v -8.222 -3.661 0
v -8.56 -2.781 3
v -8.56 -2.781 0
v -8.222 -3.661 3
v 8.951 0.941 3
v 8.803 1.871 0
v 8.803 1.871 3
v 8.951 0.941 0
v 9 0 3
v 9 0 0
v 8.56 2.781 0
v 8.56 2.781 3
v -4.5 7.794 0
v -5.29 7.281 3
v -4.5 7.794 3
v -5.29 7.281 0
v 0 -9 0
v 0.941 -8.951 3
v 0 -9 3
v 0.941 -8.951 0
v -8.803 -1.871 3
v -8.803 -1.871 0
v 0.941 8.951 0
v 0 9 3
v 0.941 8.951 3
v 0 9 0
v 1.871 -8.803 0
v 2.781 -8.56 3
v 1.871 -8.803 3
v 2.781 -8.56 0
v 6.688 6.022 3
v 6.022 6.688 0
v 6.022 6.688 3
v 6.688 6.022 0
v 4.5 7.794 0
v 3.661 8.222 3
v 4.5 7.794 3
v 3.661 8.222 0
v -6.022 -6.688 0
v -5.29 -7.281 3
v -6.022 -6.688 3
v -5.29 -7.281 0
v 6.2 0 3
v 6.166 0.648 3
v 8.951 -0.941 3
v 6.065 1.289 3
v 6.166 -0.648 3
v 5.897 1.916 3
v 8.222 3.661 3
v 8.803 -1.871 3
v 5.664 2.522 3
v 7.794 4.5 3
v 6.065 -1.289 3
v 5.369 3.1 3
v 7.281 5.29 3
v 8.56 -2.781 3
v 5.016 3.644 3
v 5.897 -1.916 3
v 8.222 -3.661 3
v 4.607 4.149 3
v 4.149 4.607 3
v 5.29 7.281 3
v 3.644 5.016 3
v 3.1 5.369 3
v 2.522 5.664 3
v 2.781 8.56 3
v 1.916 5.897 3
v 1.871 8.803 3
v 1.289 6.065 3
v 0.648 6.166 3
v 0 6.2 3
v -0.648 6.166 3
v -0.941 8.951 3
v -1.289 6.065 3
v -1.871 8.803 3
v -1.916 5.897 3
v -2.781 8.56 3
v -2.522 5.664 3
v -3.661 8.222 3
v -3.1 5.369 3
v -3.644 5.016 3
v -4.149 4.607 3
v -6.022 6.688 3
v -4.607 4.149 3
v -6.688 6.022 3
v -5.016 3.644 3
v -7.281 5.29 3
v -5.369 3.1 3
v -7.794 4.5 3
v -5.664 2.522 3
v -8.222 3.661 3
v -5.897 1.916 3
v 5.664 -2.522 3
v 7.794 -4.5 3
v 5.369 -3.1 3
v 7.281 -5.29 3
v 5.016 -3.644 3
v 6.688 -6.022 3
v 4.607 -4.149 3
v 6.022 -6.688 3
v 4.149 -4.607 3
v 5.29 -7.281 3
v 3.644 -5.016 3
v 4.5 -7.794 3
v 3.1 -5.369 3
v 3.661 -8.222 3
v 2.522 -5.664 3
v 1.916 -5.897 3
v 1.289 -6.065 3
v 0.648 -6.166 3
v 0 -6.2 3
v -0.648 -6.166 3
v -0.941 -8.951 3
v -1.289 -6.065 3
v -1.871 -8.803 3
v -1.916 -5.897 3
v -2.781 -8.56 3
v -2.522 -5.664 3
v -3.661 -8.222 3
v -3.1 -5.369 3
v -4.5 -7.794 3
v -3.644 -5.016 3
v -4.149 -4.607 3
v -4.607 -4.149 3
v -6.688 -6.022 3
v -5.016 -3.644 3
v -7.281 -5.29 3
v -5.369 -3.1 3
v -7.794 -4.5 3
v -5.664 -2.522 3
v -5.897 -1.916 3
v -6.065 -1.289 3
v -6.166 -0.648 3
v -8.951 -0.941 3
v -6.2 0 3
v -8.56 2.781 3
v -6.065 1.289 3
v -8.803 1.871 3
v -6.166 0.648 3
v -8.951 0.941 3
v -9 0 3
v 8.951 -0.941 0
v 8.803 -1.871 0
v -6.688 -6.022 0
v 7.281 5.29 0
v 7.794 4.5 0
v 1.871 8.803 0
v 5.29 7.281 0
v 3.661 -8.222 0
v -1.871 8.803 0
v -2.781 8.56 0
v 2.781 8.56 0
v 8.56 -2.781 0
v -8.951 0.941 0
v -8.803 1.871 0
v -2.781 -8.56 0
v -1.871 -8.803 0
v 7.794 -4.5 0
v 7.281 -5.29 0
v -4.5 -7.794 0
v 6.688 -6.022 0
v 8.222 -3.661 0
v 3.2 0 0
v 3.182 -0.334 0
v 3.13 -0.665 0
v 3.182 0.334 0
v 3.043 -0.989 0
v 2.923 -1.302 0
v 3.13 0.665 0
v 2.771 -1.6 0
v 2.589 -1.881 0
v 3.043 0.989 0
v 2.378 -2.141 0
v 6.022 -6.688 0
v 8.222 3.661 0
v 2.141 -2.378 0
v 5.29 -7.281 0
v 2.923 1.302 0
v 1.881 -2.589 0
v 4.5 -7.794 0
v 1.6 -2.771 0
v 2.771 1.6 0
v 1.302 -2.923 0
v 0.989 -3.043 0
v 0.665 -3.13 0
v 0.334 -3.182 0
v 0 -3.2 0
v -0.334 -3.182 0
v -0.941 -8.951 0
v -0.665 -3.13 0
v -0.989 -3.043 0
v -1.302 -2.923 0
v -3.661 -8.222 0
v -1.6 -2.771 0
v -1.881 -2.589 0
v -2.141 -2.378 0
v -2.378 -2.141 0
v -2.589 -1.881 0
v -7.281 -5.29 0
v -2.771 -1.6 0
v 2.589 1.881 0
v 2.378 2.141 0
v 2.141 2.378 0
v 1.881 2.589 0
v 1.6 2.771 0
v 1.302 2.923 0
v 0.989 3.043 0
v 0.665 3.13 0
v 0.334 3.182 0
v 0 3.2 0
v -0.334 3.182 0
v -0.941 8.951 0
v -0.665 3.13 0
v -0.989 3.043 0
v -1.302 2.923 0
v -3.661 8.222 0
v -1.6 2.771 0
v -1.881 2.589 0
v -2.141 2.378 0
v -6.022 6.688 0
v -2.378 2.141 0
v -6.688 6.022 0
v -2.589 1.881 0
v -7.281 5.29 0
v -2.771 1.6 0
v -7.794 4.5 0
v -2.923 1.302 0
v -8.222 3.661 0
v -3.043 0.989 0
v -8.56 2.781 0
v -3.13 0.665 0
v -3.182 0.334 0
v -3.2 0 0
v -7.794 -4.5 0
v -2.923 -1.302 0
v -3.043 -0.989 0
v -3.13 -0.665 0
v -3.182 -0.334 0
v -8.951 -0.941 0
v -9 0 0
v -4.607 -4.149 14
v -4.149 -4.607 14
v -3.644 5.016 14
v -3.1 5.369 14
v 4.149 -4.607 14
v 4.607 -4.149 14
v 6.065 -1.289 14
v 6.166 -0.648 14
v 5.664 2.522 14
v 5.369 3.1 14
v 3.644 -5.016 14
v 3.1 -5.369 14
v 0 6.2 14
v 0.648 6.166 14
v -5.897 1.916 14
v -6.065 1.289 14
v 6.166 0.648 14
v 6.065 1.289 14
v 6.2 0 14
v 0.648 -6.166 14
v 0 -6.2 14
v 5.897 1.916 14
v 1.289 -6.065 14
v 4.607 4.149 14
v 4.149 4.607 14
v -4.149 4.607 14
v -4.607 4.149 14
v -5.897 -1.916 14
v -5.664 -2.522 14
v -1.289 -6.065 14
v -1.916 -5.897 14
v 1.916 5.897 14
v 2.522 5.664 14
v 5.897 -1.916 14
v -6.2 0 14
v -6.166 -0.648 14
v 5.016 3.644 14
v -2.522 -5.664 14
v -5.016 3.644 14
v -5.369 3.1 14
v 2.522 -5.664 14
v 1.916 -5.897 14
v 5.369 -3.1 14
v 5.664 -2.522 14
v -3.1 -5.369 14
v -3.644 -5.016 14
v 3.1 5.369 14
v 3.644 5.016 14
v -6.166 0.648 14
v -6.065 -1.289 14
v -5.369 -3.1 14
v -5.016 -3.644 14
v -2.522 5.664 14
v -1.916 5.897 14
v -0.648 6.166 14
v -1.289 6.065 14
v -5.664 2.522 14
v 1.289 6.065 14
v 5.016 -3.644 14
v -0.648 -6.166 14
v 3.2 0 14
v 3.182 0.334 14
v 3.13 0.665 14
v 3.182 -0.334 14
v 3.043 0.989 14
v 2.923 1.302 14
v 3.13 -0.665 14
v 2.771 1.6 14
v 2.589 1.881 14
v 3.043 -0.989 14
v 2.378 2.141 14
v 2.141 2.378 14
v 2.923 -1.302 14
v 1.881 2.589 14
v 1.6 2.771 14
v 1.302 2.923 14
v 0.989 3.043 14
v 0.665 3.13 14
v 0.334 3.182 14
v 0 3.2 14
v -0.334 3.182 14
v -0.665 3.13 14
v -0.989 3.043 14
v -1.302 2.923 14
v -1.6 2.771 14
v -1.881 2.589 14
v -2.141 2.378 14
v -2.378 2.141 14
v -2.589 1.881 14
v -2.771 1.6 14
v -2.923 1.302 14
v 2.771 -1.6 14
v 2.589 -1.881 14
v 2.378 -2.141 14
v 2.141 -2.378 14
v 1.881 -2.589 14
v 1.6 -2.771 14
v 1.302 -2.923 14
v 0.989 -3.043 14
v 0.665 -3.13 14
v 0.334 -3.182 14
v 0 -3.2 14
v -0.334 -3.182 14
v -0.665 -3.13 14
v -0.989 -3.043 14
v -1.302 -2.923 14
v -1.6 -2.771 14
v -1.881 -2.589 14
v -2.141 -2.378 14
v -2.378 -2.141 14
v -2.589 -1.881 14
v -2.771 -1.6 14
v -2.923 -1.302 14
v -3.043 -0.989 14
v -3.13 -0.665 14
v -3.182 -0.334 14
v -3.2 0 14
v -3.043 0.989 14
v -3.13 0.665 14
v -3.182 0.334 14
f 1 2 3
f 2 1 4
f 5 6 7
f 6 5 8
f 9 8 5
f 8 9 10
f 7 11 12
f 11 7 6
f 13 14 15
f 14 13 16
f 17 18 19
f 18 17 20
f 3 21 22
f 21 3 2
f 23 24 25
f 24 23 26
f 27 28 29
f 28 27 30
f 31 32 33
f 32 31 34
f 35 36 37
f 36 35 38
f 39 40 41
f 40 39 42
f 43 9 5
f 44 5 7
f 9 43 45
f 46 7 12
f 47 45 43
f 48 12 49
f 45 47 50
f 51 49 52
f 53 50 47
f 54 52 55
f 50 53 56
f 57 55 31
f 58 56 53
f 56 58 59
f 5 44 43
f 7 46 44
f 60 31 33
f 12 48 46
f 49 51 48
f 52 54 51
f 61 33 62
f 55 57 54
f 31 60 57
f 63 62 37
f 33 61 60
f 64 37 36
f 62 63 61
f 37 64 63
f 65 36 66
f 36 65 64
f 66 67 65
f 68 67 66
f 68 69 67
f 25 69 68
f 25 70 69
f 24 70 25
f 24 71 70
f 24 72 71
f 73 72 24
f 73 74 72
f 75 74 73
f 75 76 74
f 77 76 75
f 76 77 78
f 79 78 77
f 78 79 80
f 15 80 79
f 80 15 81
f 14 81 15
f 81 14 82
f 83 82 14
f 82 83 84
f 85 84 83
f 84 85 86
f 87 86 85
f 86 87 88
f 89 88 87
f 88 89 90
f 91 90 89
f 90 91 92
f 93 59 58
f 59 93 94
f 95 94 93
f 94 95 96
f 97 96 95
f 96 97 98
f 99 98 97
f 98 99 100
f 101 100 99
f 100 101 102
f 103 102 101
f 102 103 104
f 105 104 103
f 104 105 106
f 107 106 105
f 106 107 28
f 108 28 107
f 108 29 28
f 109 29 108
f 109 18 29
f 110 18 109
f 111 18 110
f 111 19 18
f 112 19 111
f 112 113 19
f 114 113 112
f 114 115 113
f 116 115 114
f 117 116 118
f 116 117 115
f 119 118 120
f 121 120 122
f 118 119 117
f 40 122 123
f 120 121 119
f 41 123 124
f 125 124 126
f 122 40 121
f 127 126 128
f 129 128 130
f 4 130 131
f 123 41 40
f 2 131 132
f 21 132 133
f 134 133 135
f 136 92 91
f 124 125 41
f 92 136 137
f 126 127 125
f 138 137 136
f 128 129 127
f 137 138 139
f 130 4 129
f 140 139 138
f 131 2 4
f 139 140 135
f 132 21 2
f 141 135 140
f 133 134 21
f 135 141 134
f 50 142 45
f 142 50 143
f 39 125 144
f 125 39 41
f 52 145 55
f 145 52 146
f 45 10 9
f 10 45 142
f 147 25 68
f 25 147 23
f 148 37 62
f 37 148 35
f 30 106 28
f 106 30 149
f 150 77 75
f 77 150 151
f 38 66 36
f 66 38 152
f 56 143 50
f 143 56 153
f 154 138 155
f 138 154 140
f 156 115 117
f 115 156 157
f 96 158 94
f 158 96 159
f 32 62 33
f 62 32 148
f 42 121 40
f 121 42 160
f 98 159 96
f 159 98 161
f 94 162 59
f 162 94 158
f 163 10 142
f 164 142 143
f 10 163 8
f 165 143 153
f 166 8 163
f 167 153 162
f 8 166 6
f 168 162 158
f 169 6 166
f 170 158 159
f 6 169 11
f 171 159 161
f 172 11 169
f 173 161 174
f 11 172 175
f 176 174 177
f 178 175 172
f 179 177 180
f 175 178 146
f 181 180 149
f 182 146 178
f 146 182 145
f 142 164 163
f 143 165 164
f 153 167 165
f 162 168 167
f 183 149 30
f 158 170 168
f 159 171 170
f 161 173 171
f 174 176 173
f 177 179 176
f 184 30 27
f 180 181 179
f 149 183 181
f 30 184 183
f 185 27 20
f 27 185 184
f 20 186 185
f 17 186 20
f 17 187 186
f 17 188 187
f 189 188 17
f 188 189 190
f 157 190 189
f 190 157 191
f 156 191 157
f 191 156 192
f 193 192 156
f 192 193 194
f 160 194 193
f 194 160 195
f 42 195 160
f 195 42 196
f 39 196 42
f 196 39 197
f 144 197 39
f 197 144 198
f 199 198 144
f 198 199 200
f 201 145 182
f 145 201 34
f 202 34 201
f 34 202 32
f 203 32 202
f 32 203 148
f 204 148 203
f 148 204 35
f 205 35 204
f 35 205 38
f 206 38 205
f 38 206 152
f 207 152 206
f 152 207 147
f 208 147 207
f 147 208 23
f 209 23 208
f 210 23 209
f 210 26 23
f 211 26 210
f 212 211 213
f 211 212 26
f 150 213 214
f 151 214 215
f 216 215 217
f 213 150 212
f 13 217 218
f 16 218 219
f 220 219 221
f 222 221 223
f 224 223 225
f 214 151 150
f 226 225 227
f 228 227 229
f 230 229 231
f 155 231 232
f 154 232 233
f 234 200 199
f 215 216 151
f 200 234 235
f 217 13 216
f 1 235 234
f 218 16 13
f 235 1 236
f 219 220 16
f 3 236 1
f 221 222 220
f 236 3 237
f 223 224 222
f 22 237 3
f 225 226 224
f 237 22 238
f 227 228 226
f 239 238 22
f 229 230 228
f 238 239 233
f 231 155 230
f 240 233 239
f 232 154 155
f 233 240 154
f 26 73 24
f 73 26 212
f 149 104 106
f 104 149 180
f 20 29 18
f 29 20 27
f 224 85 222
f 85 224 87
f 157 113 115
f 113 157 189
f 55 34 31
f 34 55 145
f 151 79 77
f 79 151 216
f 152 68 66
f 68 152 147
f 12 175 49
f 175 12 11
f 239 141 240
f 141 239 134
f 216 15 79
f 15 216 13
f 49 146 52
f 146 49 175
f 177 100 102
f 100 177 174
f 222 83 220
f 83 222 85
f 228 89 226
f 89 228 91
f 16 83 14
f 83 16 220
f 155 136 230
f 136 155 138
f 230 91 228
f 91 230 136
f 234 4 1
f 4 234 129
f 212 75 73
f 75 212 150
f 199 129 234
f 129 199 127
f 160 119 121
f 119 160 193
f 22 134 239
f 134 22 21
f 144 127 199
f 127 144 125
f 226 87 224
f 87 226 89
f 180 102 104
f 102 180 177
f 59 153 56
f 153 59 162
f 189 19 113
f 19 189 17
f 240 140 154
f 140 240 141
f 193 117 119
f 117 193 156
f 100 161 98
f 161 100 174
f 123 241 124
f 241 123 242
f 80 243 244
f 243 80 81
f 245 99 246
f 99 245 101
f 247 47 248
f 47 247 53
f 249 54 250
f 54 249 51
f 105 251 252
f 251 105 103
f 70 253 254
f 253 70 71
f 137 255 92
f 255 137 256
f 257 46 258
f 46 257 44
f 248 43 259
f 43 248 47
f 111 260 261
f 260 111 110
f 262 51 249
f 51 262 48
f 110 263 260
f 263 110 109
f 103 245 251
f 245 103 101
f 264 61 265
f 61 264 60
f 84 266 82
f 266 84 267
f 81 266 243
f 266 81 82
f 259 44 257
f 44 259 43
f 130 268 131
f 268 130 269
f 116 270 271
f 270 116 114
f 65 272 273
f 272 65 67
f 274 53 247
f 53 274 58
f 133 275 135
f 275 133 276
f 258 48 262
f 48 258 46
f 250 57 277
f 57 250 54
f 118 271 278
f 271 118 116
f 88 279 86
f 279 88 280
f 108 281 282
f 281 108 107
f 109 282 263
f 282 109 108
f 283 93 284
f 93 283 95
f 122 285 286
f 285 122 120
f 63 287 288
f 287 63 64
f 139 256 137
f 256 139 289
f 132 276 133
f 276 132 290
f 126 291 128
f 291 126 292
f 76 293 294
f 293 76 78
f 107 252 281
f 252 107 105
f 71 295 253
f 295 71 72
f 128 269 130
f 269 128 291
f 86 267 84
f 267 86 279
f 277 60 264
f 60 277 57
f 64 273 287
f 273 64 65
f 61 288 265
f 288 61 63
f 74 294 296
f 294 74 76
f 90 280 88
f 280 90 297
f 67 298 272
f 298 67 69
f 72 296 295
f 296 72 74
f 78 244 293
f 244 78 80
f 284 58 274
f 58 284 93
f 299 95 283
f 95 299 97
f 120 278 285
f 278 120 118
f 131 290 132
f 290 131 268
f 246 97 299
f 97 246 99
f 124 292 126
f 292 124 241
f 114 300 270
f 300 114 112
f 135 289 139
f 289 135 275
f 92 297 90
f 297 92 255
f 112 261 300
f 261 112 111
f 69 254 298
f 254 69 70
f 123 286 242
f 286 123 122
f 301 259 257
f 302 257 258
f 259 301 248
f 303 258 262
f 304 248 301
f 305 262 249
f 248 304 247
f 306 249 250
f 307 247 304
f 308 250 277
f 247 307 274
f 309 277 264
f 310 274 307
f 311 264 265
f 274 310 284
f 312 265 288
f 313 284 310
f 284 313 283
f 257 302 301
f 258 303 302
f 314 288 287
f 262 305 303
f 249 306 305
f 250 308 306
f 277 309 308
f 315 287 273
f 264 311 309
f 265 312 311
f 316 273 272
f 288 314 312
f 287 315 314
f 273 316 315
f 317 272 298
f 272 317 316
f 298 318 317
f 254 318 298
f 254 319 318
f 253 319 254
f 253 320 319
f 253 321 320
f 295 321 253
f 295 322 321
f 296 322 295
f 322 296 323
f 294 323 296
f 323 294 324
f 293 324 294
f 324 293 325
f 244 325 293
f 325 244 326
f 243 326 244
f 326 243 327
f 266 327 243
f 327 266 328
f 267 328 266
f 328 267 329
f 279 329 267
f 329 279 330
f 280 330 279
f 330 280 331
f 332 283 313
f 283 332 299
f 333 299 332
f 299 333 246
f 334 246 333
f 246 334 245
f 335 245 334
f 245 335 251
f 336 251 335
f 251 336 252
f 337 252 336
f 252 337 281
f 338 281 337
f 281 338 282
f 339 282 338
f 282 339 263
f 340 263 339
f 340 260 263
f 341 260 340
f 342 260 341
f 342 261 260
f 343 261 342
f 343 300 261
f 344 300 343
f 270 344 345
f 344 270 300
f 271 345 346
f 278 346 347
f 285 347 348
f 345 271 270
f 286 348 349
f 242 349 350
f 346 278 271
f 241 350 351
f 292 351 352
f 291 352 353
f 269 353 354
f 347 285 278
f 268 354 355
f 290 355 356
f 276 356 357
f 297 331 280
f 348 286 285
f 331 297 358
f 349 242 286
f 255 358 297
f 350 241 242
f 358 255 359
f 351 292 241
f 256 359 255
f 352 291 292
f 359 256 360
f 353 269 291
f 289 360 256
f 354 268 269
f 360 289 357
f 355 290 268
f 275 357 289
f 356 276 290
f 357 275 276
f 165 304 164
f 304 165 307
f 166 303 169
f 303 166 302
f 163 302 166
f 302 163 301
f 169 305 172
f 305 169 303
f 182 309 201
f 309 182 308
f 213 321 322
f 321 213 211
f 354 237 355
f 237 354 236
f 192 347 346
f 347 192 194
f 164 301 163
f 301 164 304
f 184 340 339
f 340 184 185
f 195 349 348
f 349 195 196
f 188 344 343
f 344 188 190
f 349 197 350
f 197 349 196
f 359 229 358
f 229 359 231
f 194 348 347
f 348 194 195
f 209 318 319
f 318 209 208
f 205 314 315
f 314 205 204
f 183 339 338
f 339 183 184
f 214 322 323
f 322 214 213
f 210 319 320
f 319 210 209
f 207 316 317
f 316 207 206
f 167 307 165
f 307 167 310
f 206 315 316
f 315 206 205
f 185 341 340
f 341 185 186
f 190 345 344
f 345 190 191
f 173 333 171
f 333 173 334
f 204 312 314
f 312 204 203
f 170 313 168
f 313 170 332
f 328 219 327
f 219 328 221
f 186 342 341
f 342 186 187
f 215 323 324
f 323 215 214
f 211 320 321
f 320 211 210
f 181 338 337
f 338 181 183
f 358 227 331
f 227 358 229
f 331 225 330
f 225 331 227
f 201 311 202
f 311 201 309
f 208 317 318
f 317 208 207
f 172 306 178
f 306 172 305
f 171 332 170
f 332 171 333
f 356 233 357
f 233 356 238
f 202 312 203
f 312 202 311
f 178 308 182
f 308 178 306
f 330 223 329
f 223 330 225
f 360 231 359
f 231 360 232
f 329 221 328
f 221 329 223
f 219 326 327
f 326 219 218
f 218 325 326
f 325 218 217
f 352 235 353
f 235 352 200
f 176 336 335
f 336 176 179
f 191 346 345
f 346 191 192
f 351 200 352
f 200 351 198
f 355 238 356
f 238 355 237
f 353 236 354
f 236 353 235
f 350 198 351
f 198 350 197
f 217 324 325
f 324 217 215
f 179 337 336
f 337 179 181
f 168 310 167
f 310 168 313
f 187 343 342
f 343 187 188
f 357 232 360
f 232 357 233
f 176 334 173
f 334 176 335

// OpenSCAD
// Threaded mounting boss.
$fn = 60;
eps = 0.02;
thread_d = 6.4;
base_d = 18;
height = 14;
difference() { union() { cylinder(d=base_d,h=3); cylinder(d=thread_d+6,h=height); } translate([0,0,-eps]) cylinder(d=thread_d,h=height+2*eps); }
